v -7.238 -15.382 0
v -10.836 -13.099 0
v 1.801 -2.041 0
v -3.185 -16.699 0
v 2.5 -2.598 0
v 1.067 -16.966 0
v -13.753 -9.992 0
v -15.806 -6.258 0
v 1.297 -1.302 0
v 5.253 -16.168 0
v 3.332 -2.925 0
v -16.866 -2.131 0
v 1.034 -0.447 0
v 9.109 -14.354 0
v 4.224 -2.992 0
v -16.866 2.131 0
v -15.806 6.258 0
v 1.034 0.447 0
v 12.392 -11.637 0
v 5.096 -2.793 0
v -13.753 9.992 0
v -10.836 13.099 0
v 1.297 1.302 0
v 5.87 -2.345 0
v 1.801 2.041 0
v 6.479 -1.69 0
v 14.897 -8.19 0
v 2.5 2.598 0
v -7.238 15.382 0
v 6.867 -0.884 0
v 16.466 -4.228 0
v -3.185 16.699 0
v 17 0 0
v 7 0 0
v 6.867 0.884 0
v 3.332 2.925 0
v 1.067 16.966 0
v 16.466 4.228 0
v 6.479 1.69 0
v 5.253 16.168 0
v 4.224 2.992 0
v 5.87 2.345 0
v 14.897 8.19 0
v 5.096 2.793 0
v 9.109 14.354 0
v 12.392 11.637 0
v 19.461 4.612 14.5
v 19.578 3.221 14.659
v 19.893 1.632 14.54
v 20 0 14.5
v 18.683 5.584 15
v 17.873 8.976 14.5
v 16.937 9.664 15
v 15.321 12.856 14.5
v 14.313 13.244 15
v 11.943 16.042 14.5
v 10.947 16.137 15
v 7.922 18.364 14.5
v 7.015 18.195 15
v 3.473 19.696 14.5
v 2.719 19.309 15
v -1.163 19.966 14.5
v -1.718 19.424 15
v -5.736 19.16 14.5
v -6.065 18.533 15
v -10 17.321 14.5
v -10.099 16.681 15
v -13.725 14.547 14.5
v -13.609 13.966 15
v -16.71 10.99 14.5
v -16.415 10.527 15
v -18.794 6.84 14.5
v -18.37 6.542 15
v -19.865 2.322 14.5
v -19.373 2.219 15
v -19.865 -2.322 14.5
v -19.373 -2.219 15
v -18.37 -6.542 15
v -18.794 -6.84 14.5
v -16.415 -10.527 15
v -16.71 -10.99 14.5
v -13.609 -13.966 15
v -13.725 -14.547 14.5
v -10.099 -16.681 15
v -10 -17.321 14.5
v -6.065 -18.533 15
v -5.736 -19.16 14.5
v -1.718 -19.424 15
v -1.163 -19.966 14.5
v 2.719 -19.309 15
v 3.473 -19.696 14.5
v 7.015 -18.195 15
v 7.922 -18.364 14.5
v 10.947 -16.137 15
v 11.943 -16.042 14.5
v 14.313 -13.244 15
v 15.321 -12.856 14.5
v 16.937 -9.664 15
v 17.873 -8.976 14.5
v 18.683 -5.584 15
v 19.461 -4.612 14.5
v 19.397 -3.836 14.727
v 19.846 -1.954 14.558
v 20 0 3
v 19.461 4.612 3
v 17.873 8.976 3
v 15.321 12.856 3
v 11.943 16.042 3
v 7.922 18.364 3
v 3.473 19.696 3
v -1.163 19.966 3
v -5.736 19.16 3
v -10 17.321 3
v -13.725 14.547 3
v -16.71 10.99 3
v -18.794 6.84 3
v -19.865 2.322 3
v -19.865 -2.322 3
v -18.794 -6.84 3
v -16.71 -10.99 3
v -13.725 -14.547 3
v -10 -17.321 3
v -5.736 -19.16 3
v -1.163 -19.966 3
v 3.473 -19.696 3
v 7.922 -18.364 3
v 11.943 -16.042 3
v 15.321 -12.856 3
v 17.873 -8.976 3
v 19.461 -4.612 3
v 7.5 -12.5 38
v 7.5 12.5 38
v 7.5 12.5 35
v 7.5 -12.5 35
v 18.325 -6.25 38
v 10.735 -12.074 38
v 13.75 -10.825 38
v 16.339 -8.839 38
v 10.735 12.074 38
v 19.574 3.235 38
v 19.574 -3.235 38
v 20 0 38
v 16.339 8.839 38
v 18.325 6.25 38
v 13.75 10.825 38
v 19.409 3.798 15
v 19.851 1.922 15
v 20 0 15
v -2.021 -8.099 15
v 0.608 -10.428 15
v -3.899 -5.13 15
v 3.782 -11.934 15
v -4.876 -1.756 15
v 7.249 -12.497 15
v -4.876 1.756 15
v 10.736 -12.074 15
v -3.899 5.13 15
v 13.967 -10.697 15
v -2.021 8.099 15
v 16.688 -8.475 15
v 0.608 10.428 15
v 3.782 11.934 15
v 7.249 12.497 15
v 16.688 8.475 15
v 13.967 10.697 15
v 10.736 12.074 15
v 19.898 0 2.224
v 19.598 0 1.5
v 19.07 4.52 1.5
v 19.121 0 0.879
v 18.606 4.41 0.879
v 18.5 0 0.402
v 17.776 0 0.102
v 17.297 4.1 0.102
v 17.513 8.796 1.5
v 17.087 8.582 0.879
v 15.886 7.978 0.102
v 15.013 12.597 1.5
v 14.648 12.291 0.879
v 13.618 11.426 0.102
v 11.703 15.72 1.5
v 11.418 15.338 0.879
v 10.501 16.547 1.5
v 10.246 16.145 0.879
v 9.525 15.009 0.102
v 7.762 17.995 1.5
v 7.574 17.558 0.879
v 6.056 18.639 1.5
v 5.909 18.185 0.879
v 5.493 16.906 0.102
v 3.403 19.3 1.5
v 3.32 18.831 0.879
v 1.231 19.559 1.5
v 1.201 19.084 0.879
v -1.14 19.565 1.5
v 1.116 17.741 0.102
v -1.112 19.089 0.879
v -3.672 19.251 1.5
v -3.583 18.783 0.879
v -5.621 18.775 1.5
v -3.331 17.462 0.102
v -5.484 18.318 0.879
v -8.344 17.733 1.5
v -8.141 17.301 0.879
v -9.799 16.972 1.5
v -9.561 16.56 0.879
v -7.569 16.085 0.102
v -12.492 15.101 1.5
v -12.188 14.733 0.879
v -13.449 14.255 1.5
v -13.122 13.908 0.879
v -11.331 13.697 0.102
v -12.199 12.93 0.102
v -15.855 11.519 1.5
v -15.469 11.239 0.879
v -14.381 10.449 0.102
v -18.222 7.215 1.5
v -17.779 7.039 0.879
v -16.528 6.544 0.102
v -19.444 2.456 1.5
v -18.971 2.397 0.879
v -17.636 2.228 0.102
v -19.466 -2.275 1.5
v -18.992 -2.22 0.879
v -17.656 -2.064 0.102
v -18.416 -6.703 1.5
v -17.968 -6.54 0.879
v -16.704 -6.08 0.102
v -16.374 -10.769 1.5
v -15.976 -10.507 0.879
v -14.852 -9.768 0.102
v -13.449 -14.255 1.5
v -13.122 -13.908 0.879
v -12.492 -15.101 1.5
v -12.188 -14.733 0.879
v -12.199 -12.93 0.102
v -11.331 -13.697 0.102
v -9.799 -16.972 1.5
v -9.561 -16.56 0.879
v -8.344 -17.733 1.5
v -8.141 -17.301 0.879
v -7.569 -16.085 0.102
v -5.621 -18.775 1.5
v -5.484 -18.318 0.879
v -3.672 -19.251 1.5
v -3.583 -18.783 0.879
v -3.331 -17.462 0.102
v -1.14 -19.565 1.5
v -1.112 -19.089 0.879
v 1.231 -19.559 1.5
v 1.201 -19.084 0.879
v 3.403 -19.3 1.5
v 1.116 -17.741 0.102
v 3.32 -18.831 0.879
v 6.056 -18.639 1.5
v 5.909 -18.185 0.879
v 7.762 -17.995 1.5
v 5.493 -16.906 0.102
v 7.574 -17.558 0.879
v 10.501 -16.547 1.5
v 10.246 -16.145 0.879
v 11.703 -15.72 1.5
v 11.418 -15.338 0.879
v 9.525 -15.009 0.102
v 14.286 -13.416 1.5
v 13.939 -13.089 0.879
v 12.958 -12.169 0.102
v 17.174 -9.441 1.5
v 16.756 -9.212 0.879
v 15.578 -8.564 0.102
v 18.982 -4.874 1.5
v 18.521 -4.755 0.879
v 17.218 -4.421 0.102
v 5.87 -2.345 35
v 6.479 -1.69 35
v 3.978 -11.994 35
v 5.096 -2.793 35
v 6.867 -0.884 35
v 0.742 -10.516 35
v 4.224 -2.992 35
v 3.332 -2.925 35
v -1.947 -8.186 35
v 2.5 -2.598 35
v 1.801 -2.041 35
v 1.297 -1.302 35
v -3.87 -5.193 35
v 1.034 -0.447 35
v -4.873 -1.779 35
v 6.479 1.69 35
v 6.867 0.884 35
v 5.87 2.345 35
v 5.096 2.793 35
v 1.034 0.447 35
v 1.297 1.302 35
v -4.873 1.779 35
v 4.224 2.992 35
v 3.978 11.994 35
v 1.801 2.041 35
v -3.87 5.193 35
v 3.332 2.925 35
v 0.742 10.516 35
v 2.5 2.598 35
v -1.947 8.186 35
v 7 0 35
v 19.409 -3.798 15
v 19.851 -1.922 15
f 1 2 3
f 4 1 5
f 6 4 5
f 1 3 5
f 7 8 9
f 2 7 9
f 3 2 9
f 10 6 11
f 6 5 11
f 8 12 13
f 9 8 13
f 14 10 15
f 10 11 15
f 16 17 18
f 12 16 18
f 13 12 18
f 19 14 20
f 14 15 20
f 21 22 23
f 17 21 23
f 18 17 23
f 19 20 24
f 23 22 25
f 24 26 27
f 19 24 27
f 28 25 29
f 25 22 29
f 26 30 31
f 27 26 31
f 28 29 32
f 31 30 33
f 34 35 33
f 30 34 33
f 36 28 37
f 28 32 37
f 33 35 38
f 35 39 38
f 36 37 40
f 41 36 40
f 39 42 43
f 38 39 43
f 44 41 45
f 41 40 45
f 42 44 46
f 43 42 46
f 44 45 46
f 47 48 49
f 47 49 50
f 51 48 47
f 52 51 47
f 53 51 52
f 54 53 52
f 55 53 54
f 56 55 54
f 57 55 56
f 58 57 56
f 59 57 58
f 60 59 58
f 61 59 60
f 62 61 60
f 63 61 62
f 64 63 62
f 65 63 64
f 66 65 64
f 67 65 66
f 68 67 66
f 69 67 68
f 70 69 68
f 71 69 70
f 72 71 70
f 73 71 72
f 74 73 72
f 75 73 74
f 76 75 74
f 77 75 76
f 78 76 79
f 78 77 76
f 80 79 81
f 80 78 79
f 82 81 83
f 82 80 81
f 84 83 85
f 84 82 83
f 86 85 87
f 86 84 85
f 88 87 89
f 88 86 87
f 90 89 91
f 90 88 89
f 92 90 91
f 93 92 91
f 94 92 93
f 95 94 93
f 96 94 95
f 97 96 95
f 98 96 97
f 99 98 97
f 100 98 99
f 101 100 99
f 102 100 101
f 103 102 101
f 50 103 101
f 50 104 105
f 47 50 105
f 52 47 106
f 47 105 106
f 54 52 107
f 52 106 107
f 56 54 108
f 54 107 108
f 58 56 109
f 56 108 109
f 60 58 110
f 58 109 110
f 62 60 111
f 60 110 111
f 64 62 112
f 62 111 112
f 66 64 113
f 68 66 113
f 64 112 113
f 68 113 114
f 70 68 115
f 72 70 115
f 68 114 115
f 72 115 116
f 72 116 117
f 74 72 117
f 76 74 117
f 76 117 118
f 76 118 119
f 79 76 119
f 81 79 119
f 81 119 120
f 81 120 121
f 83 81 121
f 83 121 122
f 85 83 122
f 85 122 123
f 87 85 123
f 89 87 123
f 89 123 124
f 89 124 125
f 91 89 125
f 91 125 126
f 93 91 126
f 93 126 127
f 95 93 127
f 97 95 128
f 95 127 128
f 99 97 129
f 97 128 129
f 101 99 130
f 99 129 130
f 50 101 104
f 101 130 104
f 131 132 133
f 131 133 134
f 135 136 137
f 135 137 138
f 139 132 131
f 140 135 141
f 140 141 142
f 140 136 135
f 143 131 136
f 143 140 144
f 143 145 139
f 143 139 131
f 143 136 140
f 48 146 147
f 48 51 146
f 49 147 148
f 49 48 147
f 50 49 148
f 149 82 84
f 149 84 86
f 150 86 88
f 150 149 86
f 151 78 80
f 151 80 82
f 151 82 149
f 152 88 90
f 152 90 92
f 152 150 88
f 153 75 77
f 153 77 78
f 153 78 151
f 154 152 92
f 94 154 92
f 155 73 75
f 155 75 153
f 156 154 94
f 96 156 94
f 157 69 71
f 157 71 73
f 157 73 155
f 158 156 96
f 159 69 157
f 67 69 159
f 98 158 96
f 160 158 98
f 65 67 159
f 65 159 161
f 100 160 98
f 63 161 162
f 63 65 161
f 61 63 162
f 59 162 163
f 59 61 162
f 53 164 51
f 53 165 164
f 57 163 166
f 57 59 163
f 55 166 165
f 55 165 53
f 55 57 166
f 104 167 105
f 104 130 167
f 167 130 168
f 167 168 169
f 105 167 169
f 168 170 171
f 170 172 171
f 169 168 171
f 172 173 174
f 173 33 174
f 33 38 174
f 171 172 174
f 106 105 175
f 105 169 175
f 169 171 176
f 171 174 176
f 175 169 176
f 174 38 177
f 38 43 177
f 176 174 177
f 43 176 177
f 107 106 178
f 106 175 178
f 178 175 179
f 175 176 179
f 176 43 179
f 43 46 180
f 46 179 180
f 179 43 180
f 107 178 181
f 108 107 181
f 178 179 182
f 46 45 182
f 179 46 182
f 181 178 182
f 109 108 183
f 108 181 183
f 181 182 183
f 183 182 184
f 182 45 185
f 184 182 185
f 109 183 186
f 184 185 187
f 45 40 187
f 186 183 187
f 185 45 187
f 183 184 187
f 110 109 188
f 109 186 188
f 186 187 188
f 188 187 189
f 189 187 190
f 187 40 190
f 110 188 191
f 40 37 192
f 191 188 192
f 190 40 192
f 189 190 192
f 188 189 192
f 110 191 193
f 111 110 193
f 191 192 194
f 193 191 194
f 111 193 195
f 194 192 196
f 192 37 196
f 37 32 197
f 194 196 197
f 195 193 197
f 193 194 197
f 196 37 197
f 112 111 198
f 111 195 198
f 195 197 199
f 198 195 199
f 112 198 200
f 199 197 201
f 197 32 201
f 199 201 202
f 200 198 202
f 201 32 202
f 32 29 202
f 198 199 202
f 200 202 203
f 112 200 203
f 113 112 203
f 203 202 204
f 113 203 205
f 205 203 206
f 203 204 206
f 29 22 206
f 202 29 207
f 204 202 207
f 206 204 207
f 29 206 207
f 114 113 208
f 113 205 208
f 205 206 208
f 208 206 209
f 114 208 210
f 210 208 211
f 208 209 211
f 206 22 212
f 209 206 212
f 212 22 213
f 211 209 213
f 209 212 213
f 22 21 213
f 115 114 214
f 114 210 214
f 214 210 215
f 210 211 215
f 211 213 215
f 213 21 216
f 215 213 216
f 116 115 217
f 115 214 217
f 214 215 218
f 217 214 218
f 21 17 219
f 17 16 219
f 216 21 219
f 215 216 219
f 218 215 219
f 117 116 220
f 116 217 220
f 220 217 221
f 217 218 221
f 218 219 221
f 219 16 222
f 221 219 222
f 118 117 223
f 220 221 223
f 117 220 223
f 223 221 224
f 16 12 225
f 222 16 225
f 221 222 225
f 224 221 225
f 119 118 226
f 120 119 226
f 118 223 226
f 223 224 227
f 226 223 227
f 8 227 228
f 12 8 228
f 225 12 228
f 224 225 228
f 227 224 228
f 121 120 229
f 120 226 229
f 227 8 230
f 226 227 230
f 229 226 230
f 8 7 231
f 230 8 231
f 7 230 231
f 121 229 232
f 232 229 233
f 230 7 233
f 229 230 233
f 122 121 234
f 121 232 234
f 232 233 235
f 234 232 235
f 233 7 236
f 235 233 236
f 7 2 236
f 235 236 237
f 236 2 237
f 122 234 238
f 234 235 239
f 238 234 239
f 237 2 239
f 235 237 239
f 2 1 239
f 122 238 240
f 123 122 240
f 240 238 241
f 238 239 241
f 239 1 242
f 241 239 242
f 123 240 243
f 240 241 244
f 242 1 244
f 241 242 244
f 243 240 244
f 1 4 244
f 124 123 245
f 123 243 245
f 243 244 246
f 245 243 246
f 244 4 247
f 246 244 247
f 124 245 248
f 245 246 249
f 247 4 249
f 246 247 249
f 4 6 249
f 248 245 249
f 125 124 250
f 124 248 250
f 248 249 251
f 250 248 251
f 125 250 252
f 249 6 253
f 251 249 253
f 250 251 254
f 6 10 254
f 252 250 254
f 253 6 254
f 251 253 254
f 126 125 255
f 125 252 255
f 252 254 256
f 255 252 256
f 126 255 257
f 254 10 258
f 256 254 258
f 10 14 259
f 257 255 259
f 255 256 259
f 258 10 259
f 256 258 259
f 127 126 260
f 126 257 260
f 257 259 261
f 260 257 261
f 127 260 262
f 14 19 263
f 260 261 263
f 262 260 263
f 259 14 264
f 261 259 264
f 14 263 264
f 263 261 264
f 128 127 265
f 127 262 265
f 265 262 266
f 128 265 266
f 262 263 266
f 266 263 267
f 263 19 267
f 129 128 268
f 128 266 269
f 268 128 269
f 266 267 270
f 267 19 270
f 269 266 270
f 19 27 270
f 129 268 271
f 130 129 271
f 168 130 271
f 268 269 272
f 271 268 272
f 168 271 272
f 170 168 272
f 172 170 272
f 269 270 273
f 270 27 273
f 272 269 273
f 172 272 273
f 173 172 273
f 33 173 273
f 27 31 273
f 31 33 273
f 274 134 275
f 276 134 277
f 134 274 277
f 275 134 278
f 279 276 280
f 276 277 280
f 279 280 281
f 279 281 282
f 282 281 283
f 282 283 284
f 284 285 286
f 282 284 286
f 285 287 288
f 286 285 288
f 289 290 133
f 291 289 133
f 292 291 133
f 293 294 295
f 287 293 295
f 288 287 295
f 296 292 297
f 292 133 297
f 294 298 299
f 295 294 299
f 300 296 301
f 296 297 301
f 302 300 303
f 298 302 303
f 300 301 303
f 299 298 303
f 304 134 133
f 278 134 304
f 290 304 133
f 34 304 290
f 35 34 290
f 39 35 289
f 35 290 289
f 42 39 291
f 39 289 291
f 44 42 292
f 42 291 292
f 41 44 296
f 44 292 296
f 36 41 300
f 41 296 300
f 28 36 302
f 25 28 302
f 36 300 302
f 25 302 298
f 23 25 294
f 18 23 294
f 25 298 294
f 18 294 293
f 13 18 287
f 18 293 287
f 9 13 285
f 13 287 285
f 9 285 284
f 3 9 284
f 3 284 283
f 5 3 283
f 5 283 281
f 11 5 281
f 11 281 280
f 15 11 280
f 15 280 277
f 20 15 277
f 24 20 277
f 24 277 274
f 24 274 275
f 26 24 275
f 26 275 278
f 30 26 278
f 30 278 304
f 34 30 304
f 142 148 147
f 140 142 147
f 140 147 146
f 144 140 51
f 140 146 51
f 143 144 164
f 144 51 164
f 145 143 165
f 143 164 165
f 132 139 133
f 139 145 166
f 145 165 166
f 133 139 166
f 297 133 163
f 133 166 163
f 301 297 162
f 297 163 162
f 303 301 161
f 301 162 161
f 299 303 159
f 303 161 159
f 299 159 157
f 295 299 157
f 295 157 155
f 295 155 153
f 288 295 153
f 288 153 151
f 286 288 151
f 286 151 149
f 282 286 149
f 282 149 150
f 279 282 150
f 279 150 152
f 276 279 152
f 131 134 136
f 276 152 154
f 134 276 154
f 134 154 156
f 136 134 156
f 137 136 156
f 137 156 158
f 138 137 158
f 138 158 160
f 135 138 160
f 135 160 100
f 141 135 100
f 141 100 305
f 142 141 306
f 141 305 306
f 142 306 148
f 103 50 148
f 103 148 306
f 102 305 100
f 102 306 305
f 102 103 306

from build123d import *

# Parameters (mm, degrees)
SKETCH1_R           = 20
BOSS_EXTRUDE1_DEPTH = 15
SKETCH2_R           = 12.5
BOSS_EXTRUDE2_DEPTH = 23
SKETCH3_R           = 3
CUT_EXTRUDE1_DEPTH  = 48.370877129
FILLET1_R           = 3
CHAMFER1_SIZE       = 0.5
CUT_EXTRUDE2_DEPTH  = 3


with BuildPart() as part:
    # Sketch1 → Boss-Extrude1 (new body)
    with BuildSketch(Plane.XY):
        Circle(SKETCH1_R)
    extrude(amount=BOSS_EXTRUDE1_DEPTH)

    # Sketch2 → Boss-Extrude2 (add)
    with BuildSketch(Plane.XY.offset(15)):
        with Locations((7.5, 0)):
            Circle(SKETCH2_R)
    extrude(amount=BOSS_EXTRUDE2_DEPTH)

    # Sketch3 → Cut-Extrude1 (cut, through all)
    with BuildSketch(Plane.XY.offset(38)):
        with Locations((4, 0)):
            Circle(SKETCH3_R)
    extrude(amount=-CUT_EXTRUDE1_DEPTH, mode=Mode.SUBTRACT)

    # Fillet1
    fillet1_edges = [part.edges().sort_by_distance(p)[0] for p in [
        (-20, 0, 0),
    ]]
    fillet(fillet1_edges, radius=FILLET1_R)

    # Chamfer1
    # the kernel refuses this chamfer: 0.5 mm, written as the material it takes off along each edge
    with BuildSketch(Plane(origin=(0, 0, 15), x_dir=(1, 0, 0), z_dir=(0, -1, 0))) as chamfer1_piece_1_section:
        Polygon((20, -CHAMFER1_SIZE), (20 - CHAMFER1_SIZE, 0), (20, 0), align=None)
    chamfer1_piece_1 = revolve(axis=Axis((0, 0, 15), (0, 0, 1)), mode=Mode.PRIVATE)
    chamfer1_piece_1 = chamfer1_piece_1 - Plane(origin=(7.5, 0, 14.767938502), x_dir=(1, 0, 0), z_dir=(0, 0, -1)) * Cylinder(12.5, 80, mode=Mode.PRIVATE)
    add(chamfer1_piece_1, mode=Mode.SUBTRACT)

    # Sketch5 → Cut-Extrude2 (cut)
    with BuildSketch(Plane.XY.offset(38)):
        with BuildLine():
            Line((7.5, 12.5), (7.5, -12.5))
            ThreePointArc((7.5, -12.5), (-8.980754986, 0), (7.5, 12.5))
        make_face()
    extrude(amount=-CUT_EXTRUDE2_DEPTH, mode=Mode.SUBTRACT)


solid = part.part
